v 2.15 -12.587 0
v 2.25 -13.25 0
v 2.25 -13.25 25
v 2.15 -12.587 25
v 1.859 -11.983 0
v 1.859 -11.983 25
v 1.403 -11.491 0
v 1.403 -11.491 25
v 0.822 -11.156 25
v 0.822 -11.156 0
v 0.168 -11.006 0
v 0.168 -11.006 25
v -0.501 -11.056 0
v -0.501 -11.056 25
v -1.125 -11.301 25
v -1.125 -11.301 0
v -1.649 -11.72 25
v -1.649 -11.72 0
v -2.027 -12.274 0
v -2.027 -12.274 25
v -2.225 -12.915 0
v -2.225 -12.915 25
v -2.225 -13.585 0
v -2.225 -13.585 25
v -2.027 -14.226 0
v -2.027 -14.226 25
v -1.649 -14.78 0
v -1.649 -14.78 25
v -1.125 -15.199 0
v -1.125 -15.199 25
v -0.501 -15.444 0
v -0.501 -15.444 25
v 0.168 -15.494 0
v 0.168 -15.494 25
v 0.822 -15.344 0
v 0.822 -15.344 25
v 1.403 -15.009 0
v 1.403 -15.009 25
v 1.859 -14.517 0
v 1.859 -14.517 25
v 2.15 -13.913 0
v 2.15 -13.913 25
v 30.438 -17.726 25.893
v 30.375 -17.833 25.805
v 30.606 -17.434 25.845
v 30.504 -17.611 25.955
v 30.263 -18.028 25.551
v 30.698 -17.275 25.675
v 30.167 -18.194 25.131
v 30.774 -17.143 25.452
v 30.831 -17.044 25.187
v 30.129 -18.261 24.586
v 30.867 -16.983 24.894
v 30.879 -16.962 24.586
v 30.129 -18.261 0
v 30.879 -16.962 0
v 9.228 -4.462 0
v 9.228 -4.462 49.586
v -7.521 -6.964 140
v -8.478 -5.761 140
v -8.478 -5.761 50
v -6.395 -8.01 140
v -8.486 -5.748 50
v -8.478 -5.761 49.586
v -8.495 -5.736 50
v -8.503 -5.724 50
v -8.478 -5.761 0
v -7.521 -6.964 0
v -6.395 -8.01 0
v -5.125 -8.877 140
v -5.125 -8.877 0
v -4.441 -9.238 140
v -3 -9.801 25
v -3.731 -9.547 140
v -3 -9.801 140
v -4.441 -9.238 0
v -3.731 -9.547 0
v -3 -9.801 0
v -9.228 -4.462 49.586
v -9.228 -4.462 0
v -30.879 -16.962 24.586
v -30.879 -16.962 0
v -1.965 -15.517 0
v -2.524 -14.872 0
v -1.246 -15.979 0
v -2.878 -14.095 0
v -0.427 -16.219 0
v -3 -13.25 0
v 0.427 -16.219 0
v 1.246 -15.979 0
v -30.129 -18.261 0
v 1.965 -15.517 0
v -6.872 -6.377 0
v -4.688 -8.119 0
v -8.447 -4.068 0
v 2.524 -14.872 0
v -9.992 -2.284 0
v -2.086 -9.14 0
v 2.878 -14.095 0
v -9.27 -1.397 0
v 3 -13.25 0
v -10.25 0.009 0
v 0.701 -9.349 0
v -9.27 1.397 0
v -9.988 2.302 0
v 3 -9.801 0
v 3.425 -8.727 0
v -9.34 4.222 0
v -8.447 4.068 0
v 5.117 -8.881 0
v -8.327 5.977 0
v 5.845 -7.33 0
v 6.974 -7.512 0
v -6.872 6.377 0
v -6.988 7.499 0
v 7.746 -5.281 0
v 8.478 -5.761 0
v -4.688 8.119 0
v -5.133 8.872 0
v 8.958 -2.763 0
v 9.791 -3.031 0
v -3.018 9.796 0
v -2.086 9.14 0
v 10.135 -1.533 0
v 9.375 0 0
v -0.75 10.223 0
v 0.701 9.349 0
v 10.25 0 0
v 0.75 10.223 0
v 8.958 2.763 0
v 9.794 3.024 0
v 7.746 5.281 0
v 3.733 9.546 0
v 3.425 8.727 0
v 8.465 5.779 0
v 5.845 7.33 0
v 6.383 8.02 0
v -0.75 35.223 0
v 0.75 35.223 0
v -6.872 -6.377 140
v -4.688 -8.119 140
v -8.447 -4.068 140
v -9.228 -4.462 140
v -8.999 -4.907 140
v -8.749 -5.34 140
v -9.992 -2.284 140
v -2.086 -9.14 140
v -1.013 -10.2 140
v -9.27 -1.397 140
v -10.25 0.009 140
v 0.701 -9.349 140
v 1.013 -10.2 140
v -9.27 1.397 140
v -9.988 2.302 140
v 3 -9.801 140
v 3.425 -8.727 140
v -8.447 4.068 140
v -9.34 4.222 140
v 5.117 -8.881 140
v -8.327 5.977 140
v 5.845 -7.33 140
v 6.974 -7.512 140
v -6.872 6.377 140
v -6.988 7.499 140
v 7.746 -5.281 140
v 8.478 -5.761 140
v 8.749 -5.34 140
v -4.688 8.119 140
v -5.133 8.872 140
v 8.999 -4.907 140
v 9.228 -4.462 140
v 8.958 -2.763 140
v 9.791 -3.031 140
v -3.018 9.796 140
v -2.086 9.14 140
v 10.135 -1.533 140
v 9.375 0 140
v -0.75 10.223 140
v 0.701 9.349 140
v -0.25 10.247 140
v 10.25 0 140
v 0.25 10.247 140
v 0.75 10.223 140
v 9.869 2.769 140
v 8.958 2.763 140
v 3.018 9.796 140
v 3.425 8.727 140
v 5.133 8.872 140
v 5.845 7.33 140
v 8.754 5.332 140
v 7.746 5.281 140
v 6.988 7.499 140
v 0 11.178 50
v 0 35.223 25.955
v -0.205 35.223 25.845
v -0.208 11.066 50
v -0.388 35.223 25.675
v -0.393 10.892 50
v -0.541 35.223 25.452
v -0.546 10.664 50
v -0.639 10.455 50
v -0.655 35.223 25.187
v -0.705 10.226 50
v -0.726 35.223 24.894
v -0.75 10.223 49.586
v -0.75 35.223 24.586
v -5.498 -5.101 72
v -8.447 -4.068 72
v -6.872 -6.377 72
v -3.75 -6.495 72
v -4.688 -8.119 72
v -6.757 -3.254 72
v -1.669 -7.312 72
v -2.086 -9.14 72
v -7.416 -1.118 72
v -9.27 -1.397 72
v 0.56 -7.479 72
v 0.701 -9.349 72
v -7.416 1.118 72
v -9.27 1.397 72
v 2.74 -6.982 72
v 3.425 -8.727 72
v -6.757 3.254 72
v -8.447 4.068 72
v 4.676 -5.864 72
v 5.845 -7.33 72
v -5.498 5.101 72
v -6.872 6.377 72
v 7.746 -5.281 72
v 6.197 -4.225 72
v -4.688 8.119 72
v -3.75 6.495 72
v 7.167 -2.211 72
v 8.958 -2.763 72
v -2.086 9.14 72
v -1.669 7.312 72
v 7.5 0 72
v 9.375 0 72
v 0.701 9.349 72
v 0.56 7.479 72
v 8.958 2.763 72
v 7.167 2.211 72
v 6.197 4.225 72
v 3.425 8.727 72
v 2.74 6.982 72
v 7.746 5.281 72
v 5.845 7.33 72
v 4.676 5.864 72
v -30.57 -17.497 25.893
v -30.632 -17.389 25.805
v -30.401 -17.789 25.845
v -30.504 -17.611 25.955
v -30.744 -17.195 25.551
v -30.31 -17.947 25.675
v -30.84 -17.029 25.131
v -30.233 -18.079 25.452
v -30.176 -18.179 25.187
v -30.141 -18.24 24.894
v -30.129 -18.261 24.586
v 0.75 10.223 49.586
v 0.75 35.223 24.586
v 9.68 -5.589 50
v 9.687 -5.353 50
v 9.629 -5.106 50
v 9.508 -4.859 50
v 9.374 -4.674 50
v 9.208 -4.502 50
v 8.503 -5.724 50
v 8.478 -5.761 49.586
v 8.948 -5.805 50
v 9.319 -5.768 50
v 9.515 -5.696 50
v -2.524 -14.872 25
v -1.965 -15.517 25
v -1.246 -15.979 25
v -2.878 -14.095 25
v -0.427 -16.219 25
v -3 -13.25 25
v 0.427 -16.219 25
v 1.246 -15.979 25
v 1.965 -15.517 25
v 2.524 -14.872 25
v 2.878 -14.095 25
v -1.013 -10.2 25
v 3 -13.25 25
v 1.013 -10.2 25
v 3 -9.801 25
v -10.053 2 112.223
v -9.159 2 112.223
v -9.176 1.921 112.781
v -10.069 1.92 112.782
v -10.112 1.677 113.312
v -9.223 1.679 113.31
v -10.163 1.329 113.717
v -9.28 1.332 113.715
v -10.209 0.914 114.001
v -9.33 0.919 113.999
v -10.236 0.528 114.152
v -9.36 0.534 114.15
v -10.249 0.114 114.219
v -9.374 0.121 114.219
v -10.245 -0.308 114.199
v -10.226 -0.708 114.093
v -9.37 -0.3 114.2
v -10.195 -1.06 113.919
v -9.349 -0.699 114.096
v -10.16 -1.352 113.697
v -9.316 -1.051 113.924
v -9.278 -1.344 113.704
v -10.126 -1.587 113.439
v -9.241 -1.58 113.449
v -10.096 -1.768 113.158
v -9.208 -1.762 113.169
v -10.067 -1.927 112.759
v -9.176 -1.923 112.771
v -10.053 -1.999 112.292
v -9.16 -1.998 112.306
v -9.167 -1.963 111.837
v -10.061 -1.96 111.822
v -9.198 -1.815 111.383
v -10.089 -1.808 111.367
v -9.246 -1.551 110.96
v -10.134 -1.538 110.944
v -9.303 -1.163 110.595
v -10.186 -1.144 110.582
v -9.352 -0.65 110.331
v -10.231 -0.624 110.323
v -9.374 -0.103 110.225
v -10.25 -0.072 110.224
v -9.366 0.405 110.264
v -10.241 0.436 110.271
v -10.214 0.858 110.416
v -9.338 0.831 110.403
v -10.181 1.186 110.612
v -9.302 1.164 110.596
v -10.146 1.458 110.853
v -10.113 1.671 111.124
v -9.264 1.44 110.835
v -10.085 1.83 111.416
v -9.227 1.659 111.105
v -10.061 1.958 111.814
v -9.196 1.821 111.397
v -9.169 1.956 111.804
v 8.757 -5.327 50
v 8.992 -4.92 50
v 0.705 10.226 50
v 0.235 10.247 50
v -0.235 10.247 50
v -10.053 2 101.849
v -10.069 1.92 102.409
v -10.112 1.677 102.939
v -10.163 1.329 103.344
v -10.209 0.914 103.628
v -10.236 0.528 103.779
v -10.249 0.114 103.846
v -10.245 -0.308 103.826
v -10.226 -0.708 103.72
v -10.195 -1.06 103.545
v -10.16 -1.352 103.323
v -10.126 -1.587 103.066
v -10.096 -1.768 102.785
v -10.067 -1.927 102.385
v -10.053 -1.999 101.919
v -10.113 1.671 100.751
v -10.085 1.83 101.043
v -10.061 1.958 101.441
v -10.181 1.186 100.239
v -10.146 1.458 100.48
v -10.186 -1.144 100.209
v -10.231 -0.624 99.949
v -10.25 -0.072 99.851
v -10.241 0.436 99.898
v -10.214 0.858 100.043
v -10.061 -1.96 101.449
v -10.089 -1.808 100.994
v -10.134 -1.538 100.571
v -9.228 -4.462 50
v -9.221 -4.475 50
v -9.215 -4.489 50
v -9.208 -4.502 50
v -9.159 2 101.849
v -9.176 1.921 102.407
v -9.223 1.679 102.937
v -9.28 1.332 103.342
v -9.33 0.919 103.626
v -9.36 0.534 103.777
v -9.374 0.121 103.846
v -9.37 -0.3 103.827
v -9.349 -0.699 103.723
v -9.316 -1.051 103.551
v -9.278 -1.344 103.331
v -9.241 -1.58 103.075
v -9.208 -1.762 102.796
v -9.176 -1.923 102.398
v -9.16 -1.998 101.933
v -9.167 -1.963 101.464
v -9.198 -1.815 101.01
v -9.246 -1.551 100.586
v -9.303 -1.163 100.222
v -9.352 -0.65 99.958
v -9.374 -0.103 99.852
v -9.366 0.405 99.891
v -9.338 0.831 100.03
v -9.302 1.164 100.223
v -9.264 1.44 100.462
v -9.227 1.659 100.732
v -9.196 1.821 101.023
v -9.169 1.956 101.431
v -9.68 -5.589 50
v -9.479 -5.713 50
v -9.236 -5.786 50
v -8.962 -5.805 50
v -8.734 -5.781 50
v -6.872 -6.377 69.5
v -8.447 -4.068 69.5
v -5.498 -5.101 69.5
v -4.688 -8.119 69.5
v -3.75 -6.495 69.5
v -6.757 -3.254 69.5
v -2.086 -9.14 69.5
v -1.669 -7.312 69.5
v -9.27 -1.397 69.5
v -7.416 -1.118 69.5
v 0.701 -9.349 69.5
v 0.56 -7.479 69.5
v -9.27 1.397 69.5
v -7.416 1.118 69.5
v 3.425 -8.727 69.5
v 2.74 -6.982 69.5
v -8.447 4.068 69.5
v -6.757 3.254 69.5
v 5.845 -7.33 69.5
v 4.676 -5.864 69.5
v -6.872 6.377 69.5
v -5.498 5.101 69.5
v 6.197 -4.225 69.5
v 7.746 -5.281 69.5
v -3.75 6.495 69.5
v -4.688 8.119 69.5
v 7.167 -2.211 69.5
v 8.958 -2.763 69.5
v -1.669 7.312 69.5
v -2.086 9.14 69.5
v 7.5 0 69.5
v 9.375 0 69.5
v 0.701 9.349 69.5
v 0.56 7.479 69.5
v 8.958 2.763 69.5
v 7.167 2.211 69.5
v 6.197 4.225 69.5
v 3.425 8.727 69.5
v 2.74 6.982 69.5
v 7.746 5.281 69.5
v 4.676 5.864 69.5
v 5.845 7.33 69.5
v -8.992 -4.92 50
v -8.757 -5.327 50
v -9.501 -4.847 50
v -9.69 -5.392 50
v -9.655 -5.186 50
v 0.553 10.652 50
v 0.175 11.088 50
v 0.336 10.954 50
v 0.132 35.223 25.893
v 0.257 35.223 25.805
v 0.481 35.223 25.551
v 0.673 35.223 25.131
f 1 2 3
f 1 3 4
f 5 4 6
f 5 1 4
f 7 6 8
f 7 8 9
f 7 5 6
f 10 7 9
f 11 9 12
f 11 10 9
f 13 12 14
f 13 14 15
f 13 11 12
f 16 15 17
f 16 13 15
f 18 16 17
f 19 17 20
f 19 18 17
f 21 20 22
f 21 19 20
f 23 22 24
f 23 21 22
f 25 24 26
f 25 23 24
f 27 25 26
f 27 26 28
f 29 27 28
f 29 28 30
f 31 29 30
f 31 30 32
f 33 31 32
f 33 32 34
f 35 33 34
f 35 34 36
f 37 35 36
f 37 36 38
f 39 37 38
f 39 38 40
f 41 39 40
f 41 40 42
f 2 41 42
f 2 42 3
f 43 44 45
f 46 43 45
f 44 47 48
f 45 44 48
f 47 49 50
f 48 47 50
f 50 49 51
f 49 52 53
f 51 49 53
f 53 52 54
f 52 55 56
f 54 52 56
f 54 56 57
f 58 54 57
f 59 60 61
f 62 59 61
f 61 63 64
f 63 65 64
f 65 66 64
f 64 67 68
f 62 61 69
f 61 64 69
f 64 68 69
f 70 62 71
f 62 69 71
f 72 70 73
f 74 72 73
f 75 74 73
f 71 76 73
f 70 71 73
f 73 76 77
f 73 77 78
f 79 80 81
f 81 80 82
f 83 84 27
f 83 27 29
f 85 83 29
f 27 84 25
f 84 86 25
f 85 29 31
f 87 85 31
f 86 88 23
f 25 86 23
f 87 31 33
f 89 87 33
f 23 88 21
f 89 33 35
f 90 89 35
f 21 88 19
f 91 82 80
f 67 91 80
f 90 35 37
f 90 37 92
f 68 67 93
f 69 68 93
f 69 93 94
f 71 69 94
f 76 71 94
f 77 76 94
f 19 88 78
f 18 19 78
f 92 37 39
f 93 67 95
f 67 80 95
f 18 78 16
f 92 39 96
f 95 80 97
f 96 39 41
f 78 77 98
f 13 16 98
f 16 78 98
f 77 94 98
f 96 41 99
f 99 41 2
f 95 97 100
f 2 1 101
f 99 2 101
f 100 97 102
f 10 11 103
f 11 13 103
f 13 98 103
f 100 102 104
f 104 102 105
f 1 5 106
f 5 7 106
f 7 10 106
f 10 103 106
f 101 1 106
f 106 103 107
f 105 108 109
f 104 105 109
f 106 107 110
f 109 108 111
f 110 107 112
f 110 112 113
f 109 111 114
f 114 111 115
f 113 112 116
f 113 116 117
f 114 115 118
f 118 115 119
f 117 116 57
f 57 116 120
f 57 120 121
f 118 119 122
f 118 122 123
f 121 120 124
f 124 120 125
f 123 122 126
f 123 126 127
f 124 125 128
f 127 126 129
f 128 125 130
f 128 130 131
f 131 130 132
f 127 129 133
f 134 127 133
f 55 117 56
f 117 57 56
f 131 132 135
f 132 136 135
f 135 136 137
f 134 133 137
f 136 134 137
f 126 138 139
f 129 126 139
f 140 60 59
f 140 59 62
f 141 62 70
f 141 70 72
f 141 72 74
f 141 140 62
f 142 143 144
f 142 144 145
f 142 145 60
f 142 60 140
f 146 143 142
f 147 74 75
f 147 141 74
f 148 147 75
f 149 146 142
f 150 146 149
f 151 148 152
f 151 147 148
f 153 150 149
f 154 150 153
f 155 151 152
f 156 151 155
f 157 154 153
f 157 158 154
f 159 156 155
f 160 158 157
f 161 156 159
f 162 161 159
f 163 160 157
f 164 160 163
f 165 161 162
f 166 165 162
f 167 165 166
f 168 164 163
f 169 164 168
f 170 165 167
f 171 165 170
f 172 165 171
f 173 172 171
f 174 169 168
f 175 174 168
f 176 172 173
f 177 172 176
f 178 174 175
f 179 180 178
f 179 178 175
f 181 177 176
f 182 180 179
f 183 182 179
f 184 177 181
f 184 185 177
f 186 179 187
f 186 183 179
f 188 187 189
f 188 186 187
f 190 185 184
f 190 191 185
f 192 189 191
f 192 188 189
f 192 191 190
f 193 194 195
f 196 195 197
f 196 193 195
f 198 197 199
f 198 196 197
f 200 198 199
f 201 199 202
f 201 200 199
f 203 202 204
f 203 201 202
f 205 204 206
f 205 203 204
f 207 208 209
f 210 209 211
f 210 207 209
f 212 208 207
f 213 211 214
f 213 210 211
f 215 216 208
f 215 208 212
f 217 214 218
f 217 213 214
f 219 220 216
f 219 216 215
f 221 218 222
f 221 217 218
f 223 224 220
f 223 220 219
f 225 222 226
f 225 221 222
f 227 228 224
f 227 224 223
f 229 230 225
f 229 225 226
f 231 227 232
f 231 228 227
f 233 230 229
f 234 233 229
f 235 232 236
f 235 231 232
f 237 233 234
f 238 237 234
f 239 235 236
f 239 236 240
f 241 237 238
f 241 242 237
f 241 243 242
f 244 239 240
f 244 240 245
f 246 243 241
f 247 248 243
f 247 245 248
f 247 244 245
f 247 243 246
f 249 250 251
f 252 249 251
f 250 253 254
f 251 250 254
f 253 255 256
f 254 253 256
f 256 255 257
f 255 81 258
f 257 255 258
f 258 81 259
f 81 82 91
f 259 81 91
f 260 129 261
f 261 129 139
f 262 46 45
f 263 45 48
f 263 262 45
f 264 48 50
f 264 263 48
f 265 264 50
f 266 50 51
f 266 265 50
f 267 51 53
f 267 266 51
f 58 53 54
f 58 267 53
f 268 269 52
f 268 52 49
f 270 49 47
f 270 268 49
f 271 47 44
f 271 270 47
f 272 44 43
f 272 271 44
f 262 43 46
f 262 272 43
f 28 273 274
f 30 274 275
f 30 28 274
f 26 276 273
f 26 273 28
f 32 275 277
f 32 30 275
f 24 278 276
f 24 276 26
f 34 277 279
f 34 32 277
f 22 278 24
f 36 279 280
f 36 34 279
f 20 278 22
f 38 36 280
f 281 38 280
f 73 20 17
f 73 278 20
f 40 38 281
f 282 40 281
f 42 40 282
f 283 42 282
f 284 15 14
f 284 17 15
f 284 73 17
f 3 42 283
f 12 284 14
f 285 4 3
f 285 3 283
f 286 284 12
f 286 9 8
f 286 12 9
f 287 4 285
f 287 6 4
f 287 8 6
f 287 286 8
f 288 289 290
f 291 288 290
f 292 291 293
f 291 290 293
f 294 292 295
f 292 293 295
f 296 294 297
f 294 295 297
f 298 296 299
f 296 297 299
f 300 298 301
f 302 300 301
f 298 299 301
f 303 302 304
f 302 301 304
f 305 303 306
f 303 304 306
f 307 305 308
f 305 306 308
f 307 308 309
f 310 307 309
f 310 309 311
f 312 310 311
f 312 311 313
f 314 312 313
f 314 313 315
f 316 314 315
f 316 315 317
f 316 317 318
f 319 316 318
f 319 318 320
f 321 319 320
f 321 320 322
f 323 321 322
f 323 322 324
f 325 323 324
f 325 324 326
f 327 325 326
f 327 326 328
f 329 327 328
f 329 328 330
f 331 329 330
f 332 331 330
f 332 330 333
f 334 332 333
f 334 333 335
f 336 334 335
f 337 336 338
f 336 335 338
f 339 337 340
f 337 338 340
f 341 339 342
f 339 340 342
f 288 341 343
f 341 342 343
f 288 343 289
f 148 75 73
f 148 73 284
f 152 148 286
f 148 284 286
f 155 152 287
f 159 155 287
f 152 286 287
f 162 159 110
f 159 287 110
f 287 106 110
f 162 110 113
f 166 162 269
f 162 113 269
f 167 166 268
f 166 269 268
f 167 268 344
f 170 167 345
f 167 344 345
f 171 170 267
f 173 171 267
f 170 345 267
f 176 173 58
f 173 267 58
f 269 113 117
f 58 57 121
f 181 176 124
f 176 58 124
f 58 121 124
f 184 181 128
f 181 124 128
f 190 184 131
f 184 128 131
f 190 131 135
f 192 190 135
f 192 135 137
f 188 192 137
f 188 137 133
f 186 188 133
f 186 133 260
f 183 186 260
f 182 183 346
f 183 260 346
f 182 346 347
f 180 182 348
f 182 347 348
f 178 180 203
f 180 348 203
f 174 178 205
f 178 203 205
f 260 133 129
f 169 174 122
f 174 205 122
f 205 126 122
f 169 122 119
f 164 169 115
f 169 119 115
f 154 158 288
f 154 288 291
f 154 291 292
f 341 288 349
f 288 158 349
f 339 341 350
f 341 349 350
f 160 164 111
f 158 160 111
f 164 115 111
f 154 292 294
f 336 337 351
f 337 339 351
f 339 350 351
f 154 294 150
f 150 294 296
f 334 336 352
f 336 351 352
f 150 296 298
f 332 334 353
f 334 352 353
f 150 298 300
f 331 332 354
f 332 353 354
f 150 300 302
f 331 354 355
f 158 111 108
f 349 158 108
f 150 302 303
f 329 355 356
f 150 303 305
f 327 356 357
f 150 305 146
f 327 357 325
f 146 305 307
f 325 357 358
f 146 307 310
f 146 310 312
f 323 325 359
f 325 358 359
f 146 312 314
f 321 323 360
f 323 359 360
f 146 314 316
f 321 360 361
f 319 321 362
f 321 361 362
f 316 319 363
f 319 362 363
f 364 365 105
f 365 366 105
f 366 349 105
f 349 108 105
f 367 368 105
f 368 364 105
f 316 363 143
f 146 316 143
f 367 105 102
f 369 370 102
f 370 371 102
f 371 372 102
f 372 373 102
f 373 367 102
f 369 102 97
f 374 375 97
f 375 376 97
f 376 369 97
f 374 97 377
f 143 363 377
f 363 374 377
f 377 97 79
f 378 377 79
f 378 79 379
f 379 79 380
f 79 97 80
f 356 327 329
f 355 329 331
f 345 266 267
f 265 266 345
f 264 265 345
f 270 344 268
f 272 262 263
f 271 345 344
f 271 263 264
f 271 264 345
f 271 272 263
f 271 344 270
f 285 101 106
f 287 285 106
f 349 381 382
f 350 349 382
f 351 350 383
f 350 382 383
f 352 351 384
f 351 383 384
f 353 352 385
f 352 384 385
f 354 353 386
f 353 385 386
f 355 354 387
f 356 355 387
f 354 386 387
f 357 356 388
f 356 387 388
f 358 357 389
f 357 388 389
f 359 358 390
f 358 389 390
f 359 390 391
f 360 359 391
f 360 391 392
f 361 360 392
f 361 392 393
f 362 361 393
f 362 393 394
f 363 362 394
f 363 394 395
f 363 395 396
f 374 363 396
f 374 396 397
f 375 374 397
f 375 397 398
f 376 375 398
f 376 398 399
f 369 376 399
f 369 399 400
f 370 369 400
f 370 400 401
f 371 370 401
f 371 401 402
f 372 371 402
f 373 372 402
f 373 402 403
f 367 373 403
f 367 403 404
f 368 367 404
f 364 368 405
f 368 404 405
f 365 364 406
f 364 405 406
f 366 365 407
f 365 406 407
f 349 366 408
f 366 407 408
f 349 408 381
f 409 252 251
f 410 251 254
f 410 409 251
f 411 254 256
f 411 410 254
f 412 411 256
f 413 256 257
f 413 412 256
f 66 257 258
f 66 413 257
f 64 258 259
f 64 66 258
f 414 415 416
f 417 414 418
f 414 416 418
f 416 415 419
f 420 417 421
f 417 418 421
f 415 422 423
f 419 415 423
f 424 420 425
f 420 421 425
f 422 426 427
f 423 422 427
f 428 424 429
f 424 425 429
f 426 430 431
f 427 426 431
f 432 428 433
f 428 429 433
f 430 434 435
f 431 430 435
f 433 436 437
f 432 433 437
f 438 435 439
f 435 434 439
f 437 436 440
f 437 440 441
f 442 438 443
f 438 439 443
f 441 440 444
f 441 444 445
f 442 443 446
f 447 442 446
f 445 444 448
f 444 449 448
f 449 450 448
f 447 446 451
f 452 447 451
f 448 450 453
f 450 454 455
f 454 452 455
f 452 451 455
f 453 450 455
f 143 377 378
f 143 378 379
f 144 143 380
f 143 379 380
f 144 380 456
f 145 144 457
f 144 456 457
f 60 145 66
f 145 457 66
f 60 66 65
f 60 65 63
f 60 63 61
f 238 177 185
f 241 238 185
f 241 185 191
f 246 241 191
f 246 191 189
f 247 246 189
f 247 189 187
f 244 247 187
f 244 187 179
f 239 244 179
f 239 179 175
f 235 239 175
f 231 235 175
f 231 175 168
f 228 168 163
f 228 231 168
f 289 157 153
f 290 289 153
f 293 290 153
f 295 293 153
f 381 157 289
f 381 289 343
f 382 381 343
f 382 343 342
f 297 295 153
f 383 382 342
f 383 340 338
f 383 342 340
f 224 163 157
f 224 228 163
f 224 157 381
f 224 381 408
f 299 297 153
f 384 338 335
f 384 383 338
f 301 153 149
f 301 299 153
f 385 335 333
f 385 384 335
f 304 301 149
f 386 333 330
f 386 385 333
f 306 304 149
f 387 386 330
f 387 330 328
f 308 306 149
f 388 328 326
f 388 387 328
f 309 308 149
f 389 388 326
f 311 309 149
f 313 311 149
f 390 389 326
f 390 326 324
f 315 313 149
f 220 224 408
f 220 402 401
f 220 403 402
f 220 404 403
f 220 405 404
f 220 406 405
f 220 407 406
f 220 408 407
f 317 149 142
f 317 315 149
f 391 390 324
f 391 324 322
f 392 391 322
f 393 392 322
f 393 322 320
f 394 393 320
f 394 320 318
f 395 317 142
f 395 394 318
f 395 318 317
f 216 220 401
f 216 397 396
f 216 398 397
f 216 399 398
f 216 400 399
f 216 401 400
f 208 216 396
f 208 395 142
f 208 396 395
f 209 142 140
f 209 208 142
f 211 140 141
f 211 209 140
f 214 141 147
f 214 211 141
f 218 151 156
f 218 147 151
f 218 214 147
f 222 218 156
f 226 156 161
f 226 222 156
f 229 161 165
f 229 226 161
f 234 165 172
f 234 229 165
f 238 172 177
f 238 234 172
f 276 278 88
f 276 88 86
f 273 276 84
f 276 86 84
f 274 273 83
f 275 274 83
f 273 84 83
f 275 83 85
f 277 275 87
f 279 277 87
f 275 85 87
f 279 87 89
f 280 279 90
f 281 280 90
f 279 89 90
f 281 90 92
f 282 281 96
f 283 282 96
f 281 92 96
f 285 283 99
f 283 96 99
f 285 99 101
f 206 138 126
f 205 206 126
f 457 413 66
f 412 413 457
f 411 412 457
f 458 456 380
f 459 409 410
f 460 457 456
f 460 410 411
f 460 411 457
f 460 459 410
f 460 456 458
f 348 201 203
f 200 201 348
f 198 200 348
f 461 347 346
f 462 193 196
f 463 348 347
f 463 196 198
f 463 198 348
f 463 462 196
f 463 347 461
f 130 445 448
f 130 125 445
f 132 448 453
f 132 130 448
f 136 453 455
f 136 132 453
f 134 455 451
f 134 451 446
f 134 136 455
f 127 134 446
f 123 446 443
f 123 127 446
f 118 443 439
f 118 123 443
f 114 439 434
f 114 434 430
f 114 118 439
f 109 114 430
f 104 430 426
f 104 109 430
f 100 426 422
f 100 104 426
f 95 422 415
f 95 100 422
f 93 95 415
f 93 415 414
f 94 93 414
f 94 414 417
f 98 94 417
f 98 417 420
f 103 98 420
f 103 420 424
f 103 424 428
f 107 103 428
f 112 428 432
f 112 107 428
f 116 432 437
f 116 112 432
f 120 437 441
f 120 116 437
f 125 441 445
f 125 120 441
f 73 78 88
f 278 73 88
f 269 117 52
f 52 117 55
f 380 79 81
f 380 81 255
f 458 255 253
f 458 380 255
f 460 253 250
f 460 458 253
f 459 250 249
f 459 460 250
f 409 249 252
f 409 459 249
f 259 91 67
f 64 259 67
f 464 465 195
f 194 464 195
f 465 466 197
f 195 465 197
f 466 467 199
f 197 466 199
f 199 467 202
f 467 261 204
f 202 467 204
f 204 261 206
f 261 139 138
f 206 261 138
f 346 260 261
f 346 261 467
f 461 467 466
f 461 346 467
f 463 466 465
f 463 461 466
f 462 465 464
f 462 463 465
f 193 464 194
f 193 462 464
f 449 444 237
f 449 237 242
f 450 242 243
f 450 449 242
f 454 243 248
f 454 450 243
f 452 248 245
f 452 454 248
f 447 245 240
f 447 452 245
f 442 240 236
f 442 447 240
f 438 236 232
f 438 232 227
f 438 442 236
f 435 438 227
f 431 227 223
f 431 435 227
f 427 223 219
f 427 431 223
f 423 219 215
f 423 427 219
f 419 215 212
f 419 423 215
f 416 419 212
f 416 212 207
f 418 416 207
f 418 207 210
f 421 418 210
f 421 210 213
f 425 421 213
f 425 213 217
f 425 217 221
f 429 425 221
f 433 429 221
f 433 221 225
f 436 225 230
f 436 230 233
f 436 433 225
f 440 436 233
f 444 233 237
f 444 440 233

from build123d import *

# Parameters (mm, degrees)
F0_R         = 9.375
F1_DEPTH     = 140
F2_DEPTH     = 50
F3_SIZE      = 24
F4_T4_DEPTH  = 38.941125497
F4_T10_DEPTH = 38.941125497
F5_COUNT     = 3
F0_R_2       = 2.25
F6_DEPTH     = 10
F7_START     = 69.5
F0_R_3       = 7.5
F7_DEPTH     = 2.5
F8_DEPTH     = 25
F9_R         = 2
F10_DEPTH    = 25


# Not quite as in the source:
# - a fillet or chamfer that OpenCascade refuses, or shapes differently, is made with other operations: its cross-section is extruded or revolved along the edge and cut away or added


with BuildPart() as f1:
    # F0 (on Top) → F1 (new body)
    with BuildSketch(Plane.XY):
        with BuildLine():
            ThreePointArc((3, -9.801147892), (8.2405248619, -6.0955926701), (10.25, 0))
            ThreePointArc((10.25, 0), (7.5083287088, 6.9776428685), (0.75, 10.2225241501))
            ThreePointArc((0.75, 10.2225241501), (0, 10.25), (-0.75, 10.2225241501))
            ThreePointArc((-0.75, 10.2225241501), (-10.185896402, 1.1445586432), (-3, -9.801147892))
            ThreePointArc((-3, -9.801147892), (-1.5166961062, -10.1371659216), (-1.65e-08, -10.25))
            ThreePointArc((-1.65e-08, -10.25), (1.5166960899, -10.137165924), (3, -9.801147892))
        make_face()
        Circle(F0_R, mode=Mode.SUBTRACT)
    extrude(amount=F1_DEPTH)

    # F0 (on Top) → F2 (join)
    with BuildSketch(Plane.XY):
        with BuildLine():
            ThreePointArc((-0.75, 10.2225241501), (0, 10.25), (0.75, 10.2225241501))
            Line((0.75, 10.2225241501), (0.75, 35.2225241501))
            Line((0.75, 35.2225241501), (-0.75, 35.2225241501))
            Line((-0.75, 35.2225241501), (-0.75, 10.2225241501))
        make_face()
    extrude(amount=F2_DEPTH)

    # F3
    f3_edges = [f1.edges().sort_by_distance(p)[0] for p in [
        (0, 35.222524, 50),
    ]]
    chamfer(f3_edges, length=F3_SIZE)

    # F4: fillet of radius 1 on 2 edges, made by hand


with BuildPart() as f4_tool2:
    # F4_s3 → F4_t4 (new body)
    with BuildSketch(Plane(origin=(0, -21.1565048779, 21.1565048779), x_dir=(1, 0, 0), z_dir=(0, 0.7071067812, -0.7071067812))):
        with BuildLine():
            ThreePointArc((0.75, -42.2908619879), (0.4571067812, -42.9979687691), (-0.25, -43.2908619879))
            Line((-0.25, -43.2908619879), (-0.25, -43.3108619879))
            Line((-0.25, -43.3108619879), (0.77, -43.3108619879))
            Line((0.77, -43.3108619879), (0.77, -42.2908619879))
            Line((0.77, -42.2908619879), (0.75, -42.2908619879))
        make_face()
    extrude(amount=F4_T4_DEPTH)

    split(bisect_by=Plane.XZ.offset(-35.2225241501), keep=Keep.TOP)

    split(bisect_by=Plane.XY.offset(50), keep=Keep.BOTTOM)


with BuildPart() as f1_1:
    add(f1.part)

    # F4_t1: cut F4_tool2
    add(f4_tool2.part, mode=Mode.SUBTRACT)


with BuildPart() as f4_tool8:
    # F4_s9 → F4_t10 (new body)
    with BuildSketch(Plane(origin=(0, -21.1565048779, 21.1565048779), x_dir=(1, 0, 0), z_dir=(0, 0.7071067812, -0.7071067812))):
        with BuildLine():
            ThreePointArc((0.25, -43.2908619879), (-0.4571067812, -42.9979687691), (-0.75, -42.2908619879))
            Line((-0.75, -42.2908619879), (-0.77, -42.2908619879))
            Line((-0.77, -42.2908619879), (-0.77, -43.3108619879))
            Line((-0.77, -43.3108619879), (0.25, -43.3108619879))
            Line((0.25, -43.3108619879), (0.25, -43.2908619879))
        make_face()
    extrude(amount=F4_T10_DEPTH)

    split(bisect_by=Plane.XZ.offset(-35.2225241501), keep=Keep.TOP)

    split(bisect_by=Plane.XY.offset(50), keep=Keep.BOTTOM)


with BuildPart() as f1_2:
    add(f1_1.part)

    # F4_t7: cut F4_tool8
    add(f4_tool8.part, mode=Mode.SUBTRACT)


with BuildPart() as f5_1:
    # F5: instance of F1
    add(f1_2.part.rotate(Axis((0, 0, 0), (0, 0, -1)), 1 * 360 / F5_COUNT))


with BuildPart() as f5_2:
    # F5: instance of F1
    add(f1_2.part.rotate(Axis((0, 0, 0), (0, 0, -1)), 2 * 360 / F5_COUNT))


with BuildPart() as f1_3:
    add(f1_2.part)

    add(f5_1.part)  # F6 merges F5_1

    add(f5_2.part)  # F6 merges F5_2
    # F0 (on Top) → F6 (join)
    with BuildSketch(Plane.XY):
        with BuildLine():
            ThreePointArc((3, -13.25), (2.1213203377, -11.1286796506), (-1.65e-08, -10.25))
            ThreePointArc((-1.65e-08, -10.25), (-2.1213203494, -11.1286796623), (-3, -13.25))
            ThreePointArc((-3, -13.25), (0, -16.25), (3, -13.25))
        make_face()
        with Locations((0, -13.25)):
            Circle(F0_R_2, mode=Mode.SUBTRACT)
        with BuildLine():
            ThreePointArc((-3, -13.25), (-2.1213203494, -11.1286796623), (-1.65e-08, -10.25))
            ThreePointArc((-1.65e-08, -10.25), (-1.5166961062, -10.1371659216), (-3, -9.801147892))
            Line((-3, -9.801147892), (-3, -13.25))
        make_face()
        with BuildLine():
            Line((3, -13.25), (3, -9.801147892))
            ThreePointArc((3, -9.801147892), (1.5166960899, -10.137165924), (-1.65e-08, -10.25))
            ThreePointArc((-1.65e-08, -10.25), (2.1213203377, -11.1286796506), (3, -13.25))
        make_face()
    extrude(amount=F6_DEPTH)

    # F0 (on Top) → F7 (join)
    with BuildSketch(Plane.XY.offset(F7_START)):
        Circle(F0_R)
        Circle(F0_R_3, mode=Mode.SUBTRACT)
    extrude(amount=F7_DEPTH)

    # F0 (on Top) → F8 (join)
    with BuildSketch(Plane.XY):
        with BuildLine():
            ThreePointArc((3, -13.25), (2.1213203377, -11.1286796506), (-1.65e-08, -10.25))
            ThreePointArc((-1.65e-08, -10.25), (-2.1213203494, -11.1286796623), (-3, -13.25))
            ThreePointArc((-3, -13.25), (0, -16.25), (3, -13.25))
        make_face()
        with Locations((0, -13.25)):
            Circle(F0_R_2, mode=Mode.SUBTRACT)
        with BuildLine():
            Line((3, -13.25), (3, -9.801147892))
            ThreePointArc((3, -9.801147892), (1.5166960899, -10.137165924), (-1.65e-08, -10.25))
            ThreePointArc((-1.65e-08, -10.25), (2.1213203377, -11.1286796506), (3, -13.25))
        make_face()
        with BuildLine():
            ThreePointArc((-3, -13.25), (-2.1213203494, -11.1286796623), (-1.65e-08, -10.25))
            ThreePointArc((-1.65e-08, -10.25), (-1.5166961062, -10.1371659216), (-3, -9.801147892))
            Line((-3, -9.801147892), (-3, -13.25))
        make_face()
    extrude(amount=F8_DEPTH)

    # F9 (on Right) → F10 (cut)
    with BuildSketch(Plane.YZ):
        with Locations((0, 112.2226320051)):
            Circle(F9_R)
        with Locations((0, 101.8494740129)):
            Circle(F9_R)
    extrude(amount=-F10_DEPTH, mode=Mode.SUBTRACT)


solid = f1_3.part
